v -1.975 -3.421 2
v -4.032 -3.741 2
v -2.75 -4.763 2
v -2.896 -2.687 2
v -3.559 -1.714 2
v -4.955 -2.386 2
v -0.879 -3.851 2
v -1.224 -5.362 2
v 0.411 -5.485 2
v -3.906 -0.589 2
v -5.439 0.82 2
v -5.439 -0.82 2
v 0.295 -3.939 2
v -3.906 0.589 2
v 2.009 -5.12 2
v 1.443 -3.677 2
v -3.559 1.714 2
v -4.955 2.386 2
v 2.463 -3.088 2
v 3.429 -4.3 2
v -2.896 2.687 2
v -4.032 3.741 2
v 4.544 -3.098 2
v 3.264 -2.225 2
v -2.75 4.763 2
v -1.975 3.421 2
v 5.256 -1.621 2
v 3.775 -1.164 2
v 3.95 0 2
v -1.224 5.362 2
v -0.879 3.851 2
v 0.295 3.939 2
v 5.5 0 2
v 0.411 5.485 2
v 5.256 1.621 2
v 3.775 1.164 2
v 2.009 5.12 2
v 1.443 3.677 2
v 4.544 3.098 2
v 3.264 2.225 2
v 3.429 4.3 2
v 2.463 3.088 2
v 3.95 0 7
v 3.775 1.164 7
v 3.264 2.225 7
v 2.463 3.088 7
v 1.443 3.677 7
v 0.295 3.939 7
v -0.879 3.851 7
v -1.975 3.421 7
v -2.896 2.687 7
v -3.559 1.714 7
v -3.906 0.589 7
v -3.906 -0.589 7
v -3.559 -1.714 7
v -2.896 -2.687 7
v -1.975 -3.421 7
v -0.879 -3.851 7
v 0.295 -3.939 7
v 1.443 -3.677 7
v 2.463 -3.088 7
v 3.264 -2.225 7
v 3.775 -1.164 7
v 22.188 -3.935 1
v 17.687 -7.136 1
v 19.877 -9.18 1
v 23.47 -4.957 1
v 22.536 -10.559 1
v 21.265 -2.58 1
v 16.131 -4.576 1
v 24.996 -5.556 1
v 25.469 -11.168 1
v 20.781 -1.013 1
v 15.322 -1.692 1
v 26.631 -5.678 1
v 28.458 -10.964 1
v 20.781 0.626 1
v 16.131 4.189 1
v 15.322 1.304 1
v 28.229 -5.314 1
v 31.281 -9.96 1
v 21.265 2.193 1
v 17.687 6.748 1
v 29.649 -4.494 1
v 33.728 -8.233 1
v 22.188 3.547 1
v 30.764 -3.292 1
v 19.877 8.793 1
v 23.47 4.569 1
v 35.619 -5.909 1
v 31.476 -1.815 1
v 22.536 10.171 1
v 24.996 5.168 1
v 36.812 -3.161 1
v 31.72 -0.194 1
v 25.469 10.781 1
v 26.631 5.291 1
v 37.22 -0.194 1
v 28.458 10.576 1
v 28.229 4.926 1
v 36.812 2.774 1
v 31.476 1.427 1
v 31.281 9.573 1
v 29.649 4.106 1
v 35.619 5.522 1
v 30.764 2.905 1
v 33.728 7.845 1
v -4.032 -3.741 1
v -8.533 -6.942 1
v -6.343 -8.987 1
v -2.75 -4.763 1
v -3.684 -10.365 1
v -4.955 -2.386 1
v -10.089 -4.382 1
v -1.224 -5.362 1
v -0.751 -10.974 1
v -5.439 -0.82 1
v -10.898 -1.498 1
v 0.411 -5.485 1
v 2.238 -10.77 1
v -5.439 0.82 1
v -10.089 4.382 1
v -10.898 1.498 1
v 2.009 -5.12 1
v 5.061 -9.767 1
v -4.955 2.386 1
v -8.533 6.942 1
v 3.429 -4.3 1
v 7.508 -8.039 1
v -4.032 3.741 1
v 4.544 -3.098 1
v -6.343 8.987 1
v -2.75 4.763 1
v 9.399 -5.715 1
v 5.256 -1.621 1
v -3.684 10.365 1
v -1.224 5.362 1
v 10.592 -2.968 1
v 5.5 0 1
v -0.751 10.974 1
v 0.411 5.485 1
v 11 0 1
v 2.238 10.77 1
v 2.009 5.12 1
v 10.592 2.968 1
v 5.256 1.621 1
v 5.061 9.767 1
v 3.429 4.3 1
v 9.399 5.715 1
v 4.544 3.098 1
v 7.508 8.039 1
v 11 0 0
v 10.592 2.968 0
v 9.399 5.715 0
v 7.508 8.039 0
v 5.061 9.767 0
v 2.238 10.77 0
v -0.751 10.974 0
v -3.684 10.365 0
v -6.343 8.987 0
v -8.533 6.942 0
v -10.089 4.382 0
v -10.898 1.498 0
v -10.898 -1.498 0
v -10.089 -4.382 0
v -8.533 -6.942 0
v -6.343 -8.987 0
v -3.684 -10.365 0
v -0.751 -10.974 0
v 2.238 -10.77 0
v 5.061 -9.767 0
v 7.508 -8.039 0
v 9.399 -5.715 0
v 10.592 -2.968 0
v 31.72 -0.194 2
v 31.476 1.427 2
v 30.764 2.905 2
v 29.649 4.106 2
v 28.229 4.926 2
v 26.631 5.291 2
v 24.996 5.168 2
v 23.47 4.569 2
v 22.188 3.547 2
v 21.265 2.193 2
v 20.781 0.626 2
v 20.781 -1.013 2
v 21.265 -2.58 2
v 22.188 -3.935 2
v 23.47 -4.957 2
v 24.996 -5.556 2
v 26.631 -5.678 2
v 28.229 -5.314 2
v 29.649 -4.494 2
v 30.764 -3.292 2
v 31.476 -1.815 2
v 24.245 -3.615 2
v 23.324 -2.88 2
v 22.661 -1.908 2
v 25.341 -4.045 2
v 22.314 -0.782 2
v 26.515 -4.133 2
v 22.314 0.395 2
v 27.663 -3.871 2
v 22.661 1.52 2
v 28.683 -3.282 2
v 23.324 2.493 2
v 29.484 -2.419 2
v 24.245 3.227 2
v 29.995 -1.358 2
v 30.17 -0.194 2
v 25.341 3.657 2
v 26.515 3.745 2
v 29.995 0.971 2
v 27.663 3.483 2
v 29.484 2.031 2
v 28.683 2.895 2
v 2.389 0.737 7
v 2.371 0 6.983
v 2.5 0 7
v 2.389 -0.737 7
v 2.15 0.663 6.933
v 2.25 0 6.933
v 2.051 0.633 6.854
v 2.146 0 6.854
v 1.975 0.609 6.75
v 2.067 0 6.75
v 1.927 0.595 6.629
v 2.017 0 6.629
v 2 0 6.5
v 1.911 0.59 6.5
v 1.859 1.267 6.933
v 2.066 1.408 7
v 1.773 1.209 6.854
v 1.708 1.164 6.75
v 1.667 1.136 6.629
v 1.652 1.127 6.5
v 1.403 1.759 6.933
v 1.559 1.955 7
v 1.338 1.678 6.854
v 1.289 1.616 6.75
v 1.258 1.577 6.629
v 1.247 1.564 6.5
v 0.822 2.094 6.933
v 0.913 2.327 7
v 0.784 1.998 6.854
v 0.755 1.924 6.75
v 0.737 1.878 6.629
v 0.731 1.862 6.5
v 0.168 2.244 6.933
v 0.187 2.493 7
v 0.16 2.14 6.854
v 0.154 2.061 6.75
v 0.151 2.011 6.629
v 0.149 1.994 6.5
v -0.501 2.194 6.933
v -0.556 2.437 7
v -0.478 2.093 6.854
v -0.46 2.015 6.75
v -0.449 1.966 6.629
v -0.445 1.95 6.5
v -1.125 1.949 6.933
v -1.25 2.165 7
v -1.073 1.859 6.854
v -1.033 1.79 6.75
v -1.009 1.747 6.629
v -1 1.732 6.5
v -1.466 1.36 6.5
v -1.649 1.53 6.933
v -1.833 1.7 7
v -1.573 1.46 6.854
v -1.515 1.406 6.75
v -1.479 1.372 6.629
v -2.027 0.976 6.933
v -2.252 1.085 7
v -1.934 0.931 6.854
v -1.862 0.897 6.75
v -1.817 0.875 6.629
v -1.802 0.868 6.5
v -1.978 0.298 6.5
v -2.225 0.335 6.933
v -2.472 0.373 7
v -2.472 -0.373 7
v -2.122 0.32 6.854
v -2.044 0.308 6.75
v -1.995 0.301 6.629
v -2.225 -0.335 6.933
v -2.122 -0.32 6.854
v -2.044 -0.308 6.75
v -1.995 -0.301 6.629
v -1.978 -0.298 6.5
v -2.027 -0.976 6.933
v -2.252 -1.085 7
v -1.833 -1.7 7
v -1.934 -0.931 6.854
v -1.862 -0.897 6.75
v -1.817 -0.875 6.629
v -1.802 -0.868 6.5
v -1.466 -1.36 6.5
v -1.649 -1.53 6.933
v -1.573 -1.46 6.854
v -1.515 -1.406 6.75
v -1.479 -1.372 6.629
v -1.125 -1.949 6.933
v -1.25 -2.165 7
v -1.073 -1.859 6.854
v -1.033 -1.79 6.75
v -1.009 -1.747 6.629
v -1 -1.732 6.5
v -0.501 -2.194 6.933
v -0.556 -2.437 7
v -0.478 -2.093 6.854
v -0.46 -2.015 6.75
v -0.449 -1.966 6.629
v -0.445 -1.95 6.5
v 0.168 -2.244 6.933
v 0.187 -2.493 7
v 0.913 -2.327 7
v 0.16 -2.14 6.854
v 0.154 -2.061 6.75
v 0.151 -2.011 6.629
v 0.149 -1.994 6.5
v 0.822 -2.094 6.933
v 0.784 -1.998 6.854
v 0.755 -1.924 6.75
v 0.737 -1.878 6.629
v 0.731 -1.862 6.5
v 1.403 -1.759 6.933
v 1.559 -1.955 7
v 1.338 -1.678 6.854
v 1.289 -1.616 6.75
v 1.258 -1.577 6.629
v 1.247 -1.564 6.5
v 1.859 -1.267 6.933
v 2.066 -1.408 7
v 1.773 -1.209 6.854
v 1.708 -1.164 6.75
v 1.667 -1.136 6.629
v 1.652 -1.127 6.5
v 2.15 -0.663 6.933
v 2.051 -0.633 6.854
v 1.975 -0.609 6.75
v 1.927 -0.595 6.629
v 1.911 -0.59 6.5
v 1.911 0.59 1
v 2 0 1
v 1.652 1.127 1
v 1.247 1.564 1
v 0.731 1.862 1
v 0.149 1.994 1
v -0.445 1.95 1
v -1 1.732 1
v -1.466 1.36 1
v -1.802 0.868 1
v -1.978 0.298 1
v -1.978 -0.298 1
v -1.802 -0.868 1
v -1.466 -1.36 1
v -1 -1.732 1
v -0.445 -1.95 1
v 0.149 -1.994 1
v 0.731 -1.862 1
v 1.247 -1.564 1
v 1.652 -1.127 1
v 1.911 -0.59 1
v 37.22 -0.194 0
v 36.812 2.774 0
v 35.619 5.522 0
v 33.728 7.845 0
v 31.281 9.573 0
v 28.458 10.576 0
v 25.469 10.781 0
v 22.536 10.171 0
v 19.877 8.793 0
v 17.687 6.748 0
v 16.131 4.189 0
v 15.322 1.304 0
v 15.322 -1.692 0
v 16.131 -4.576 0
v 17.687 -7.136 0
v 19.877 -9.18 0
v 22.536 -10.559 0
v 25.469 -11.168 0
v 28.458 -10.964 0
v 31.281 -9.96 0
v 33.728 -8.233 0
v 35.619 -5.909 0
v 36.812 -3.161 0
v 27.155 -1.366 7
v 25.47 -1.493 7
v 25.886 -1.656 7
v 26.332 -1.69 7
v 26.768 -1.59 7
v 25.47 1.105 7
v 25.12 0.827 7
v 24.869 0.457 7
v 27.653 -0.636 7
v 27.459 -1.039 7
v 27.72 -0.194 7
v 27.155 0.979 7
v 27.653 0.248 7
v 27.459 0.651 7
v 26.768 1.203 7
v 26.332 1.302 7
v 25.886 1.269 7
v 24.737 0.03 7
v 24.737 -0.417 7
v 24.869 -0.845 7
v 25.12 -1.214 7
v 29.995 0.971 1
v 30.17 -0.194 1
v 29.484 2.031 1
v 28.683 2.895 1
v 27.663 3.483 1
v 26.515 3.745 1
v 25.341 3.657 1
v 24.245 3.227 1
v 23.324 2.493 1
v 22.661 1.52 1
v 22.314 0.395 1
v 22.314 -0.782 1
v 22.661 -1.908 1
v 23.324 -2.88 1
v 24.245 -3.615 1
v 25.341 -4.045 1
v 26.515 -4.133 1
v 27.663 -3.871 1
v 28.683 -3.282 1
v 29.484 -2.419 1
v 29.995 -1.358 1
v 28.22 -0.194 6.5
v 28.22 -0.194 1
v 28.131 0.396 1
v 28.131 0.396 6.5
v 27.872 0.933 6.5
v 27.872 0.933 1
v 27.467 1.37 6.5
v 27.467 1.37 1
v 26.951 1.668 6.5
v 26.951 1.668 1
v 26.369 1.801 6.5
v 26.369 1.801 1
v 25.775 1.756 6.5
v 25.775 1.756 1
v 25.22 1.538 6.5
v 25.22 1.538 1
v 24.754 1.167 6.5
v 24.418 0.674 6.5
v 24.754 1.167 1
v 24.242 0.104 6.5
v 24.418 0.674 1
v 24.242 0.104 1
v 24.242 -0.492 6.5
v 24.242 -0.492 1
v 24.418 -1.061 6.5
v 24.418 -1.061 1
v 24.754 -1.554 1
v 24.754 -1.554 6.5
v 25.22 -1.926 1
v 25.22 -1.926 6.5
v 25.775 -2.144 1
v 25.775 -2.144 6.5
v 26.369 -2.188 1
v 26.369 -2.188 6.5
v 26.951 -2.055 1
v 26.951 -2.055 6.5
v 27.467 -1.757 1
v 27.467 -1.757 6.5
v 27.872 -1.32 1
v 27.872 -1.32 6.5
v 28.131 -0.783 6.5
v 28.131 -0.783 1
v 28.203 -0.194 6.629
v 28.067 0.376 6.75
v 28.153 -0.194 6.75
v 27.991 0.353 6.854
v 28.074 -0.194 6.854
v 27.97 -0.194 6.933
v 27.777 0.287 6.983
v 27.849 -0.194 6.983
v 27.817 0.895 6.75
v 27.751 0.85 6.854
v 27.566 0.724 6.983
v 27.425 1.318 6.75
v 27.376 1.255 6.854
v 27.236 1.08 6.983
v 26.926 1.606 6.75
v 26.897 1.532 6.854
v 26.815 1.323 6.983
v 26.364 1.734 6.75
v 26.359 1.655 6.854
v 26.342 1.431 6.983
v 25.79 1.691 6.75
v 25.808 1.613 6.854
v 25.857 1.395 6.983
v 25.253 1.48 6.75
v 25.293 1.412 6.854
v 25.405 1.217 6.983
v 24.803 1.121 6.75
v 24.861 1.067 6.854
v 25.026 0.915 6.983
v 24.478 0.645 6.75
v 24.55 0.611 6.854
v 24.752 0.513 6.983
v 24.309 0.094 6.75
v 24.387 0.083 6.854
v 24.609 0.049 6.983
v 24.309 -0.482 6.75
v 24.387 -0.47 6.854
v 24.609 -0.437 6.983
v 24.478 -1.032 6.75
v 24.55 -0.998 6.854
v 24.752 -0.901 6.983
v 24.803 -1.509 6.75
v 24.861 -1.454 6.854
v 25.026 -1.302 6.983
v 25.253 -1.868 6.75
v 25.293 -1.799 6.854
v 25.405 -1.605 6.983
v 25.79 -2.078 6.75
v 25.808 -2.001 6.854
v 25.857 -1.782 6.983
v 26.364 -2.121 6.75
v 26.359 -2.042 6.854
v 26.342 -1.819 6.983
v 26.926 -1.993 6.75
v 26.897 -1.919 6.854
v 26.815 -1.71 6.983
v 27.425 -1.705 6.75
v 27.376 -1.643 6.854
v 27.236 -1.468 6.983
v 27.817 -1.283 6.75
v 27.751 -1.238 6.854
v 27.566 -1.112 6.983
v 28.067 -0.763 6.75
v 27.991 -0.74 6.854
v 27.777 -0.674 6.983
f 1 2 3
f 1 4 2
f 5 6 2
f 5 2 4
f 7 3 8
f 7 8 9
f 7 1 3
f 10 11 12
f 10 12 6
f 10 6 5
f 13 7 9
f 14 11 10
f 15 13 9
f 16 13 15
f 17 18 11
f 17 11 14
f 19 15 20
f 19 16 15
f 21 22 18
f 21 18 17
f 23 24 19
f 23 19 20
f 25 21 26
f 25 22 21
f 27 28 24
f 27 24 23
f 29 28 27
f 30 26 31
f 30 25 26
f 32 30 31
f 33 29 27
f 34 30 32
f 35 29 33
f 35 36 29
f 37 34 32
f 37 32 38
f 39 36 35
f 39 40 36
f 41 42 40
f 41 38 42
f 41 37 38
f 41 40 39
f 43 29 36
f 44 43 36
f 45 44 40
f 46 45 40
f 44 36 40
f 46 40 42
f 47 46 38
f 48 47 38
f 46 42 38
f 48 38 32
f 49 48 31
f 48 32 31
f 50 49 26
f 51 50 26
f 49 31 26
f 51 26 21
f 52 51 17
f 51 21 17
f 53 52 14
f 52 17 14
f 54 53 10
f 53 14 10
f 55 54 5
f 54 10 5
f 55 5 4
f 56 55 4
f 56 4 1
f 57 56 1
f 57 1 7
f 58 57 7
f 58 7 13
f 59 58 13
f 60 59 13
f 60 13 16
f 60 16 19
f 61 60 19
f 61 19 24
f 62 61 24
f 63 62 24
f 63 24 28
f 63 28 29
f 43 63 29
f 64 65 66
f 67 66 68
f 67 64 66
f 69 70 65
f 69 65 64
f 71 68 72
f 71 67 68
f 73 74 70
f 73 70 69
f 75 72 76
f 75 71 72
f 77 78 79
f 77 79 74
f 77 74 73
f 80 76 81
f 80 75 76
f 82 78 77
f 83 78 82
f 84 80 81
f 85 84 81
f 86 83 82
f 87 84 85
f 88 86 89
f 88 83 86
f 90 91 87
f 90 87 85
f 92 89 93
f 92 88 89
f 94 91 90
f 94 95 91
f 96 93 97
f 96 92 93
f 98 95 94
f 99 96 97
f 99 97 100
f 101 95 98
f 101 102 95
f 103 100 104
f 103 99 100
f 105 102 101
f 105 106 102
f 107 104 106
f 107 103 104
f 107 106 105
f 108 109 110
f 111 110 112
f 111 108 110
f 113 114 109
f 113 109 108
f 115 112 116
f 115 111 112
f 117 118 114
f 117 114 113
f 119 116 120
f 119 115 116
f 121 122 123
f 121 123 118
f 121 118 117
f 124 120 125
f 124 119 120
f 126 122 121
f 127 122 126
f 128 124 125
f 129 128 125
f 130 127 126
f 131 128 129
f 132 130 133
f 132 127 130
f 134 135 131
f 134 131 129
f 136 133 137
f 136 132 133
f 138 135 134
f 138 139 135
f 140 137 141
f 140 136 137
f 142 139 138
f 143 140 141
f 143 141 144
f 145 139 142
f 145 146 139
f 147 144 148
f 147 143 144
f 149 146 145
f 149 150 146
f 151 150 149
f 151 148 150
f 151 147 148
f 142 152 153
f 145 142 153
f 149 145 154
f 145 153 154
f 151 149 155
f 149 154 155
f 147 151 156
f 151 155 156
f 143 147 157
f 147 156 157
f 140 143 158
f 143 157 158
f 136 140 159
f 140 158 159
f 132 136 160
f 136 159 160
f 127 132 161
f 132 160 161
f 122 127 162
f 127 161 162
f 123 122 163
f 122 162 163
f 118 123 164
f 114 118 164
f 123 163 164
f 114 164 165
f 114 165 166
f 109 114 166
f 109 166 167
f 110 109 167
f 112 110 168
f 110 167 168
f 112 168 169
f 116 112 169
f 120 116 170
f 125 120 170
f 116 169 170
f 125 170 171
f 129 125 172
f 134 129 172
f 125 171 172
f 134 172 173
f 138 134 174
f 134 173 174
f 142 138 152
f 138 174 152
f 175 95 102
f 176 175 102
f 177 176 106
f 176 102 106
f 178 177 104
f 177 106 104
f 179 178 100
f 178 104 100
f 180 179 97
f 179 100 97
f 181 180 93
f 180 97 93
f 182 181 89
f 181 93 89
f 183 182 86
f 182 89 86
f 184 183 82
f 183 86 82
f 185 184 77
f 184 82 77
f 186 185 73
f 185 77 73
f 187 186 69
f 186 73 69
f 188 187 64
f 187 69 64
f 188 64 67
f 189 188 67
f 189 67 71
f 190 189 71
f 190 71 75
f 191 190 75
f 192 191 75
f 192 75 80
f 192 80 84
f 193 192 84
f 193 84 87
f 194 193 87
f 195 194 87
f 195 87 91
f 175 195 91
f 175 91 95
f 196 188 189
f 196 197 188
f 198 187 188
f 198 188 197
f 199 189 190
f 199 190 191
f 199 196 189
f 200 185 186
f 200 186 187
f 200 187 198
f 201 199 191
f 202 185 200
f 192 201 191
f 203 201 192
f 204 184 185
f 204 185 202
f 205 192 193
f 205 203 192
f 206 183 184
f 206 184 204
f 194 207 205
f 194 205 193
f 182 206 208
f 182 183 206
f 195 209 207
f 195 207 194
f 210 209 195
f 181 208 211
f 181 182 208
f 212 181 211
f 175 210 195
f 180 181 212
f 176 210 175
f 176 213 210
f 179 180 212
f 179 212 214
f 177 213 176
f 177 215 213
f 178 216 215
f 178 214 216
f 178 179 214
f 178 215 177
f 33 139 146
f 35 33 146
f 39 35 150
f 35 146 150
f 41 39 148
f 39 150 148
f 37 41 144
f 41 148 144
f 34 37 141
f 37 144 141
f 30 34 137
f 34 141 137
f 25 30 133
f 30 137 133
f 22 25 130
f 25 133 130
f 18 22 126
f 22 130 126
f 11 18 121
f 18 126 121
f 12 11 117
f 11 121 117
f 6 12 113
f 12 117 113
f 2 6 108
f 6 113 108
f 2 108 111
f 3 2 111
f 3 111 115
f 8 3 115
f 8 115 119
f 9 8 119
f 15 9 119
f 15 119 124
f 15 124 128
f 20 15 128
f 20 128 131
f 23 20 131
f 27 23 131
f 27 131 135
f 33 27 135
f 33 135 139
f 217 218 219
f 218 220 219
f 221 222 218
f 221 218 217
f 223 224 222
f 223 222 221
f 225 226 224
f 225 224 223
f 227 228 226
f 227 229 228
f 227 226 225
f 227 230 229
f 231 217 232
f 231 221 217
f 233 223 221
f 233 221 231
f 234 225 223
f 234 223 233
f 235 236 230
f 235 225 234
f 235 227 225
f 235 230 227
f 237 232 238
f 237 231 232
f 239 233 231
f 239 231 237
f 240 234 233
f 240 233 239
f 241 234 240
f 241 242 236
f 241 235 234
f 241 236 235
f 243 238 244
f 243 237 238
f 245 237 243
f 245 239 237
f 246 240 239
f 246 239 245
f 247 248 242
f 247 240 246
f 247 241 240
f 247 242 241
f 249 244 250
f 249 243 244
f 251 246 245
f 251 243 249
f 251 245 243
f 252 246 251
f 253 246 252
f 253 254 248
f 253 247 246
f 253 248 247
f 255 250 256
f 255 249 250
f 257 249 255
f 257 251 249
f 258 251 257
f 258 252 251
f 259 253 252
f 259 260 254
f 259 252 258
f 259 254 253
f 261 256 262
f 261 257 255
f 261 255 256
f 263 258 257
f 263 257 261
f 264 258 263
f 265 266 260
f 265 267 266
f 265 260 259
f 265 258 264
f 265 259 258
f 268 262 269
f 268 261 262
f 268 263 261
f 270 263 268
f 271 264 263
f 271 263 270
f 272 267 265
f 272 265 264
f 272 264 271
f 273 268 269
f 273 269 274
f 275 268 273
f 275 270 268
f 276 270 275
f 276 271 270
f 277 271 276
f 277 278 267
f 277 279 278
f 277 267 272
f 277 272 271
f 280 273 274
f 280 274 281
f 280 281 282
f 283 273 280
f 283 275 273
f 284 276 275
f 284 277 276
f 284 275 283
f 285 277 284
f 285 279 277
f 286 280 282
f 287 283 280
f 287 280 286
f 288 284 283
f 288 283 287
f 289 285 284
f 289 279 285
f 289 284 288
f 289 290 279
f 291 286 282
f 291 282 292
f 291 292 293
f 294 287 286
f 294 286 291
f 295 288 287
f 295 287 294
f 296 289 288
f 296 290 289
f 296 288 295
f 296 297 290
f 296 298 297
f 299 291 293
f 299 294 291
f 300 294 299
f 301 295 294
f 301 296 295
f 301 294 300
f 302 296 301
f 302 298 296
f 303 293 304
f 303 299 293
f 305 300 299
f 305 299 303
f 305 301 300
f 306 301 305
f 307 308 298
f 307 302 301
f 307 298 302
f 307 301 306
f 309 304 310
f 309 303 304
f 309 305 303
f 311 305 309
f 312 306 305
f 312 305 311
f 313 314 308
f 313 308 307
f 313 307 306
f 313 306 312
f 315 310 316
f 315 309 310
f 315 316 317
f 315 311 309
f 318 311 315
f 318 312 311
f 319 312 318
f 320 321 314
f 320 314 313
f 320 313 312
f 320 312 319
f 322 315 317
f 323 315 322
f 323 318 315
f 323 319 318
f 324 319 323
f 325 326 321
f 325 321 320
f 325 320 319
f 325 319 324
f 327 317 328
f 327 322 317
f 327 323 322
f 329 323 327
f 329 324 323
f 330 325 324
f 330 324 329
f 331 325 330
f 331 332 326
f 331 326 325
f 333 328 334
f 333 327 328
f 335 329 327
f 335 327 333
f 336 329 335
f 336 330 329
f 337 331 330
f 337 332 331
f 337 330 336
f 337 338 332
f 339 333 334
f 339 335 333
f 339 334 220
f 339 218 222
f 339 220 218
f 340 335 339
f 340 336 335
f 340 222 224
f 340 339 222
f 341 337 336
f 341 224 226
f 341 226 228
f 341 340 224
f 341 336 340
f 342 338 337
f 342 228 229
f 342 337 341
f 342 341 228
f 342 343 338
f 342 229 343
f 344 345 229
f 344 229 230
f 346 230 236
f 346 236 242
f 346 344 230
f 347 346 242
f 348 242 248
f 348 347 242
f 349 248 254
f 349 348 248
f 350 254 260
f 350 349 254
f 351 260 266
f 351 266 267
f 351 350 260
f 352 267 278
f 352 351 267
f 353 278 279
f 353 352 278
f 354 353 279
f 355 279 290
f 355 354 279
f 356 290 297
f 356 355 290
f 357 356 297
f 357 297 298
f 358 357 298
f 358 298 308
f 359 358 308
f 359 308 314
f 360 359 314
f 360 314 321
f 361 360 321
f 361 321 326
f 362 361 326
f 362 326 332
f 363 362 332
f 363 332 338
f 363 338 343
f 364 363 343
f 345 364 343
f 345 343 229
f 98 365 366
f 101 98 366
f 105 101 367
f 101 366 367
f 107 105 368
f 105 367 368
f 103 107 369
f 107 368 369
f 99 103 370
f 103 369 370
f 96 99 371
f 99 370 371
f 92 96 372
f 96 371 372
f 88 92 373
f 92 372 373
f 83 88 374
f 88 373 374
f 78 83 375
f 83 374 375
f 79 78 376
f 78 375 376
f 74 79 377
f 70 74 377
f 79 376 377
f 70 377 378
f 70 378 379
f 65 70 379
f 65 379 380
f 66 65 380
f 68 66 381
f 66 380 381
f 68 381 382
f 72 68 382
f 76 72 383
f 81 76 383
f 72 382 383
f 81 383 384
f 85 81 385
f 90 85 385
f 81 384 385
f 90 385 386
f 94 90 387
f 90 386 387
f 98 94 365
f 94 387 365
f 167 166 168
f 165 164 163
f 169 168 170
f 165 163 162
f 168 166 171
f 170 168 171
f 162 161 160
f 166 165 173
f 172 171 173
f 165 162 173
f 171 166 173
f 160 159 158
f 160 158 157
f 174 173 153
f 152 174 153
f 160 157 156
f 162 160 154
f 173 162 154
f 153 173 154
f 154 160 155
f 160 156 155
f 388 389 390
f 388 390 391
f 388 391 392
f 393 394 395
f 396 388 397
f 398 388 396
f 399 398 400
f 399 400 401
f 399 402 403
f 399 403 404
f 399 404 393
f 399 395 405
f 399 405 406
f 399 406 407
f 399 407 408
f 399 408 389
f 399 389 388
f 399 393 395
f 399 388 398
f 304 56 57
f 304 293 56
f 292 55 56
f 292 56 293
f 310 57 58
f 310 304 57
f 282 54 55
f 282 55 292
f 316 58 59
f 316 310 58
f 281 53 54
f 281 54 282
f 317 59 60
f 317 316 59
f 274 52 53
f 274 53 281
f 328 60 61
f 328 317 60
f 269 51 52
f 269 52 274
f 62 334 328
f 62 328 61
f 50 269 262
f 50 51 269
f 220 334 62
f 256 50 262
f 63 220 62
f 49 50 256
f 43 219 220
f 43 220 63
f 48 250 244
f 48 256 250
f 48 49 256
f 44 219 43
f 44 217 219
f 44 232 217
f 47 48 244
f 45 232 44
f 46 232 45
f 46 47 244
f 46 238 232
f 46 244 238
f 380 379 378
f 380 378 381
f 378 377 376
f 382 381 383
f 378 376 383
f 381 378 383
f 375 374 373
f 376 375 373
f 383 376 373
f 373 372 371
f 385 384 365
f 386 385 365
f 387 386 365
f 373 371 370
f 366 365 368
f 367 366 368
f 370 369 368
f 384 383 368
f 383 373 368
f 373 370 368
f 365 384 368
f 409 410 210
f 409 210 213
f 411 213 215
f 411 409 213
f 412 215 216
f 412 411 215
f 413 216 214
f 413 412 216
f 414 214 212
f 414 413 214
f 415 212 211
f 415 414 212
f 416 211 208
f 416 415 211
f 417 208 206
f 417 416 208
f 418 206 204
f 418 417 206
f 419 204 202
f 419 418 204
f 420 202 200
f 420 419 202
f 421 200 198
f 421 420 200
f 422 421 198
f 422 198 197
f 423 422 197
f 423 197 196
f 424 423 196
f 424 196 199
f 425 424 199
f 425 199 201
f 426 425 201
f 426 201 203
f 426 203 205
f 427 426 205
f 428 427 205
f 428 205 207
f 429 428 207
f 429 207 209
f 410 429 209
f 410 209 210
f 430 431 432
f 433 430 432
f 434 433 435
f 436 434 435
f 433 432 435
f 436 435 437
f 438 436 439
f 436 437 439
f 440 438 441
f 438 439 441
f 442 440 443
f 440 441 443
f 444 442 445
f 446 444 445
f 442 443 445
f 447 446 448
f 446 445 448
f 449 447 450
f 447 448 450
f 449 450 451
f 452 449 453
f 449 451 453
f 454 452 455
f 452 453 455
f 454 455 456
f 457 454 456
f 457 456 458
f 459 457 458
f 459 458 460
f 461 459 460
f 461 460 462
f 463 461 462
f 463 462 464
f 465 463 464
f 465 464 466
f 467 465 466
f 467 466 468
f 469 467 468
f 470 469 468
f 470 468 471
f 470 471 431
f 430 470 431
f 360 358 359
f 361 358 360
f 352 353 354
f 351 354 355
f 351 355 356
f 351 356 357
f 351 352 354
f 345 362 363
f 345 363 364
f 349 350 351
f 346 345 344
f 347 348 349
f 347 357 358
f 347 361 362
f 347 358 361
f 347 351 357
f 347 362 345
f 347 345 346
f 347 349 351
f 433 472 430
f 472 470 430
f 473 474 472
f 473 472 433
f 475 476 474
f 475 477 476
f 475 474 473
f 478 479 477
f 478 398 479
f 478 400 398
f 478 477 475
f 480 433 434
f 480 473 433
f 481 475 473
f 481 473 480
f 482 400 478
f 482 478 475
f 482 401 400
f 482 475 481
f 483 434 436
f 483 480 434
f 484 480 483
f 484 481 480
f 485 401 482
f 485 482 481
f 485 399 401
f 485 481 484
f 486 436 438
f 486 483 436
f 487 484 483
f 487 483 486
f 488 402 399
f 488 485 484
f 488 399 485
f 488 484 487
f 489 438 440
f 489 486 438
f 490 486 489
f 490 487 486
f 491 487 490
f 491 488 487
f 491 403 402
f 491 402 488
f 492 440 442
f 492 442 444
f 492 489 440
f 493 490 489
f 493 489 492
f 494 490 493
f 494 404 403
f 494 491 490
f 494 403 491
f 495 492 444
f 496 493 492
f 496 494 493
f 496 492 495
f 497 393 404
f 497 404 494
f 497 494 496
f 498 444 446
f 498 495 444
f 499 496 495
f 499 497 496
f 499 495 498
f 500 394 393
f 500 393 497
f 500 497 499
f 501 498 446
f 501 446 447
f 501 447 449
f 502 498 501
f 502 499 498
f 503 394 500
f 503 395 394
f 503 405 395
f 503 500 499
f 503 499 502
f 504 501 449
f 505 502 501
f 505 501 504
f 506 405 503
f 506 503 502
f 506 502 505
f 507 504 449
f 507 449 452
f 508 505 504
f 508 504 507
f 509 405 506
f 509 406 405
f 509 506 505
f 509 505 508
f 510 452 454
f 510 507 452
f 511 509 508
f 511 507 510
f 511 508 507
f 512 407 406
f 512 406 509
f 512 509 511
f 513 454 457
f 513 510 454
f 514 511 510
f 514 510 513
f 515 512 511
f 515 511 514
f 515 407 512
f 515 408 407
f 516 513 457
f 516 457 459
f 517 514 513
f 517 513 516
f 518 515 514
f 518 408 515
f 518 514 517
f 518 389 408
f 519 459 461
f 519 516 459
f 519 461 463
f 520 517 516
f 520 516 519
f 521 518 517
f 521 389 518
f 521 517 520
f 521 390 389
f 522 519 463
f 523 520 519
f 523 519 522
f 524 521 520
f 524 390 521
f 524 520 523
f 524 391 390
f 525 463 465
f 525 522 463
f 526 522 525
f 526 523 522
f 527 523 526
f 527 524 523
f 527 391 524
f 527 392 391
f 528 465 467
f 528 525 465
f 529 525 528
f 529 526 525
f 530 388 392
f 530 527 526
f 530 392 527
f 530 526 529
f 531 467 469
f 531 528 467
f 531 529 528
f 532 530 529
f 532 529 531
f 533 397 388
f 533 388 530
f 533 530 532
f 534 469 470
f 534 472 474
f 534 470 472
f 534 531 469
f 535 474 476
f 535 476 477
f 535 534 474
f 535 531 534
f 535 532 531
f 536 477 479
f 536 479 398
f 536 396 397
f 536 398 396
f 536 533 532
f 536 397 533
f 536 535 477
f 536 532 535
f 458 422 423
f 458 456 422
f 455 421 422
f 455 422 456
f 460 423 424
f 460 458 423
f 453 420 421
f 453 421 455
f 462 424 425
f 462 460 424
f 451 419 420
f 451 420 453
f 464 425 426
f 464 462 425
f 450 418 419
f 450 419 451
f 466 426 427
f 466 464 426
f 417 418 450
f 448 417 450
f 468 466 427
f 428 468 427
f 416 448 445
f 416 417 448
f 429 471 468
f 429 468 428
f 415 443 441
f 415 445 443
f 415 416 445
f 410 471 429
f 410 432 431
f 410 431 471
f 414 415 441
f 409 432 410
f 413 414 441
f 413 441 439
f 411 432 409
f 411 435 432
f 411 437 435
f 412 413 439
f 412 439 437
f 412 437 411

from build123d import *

# Parameters (mm, degrees)
F0_R     = 11
F0_R_2   = 5.5
F1_DEPTH = 1
F0_R_3   = 3.95
F2_DEPTH = 2
F0_R_4   = 2
F3_DEPTH = 7
F4_DEPTH = 1
F5_R     = 0.5
F5_2_R   = 0.5


with BuildPart() as f1:
    # F0 (on Top) → F1 (new body)
    with BuildSketch(Plane.XY):
        Circle(F0_R)
        Circle(F0_R_2, mode=Mode.SUBTRACT)
    extrude(amount=F1_DEPTH)

    # F0 (on Top) → F2 (join)
    with BuildSketch(Plane.XY):
        Circle(F0_R_2)
        Circle(F0_R_3, mode=Mode.SUBTRACT)
    extrude(amount=F2_DEPTH)

    # F0 (on Top) → F3 (join)
    with BuildSketch(Plane.XY):
        Circle(F0_R_3)
        Circle(F0_R_4, mode=Mode.SUBTRACT)
    extrude(amount=F3_DEPTH)

    # F0 (on Top) → F4, piece 2 (join)
    with BuildSketch(Plane.XY):
        Circle(F0_R_4)
    extrude(amount=F4_DEPTH)

    # F5
    f5_edges = [f1.edges().sort_by_distance(p)[0] for p in [
        (-2, 0, 7),
    ]]
    fillet(f5_edges, radius=F5_R)


with BuildPart() as f1b:
    # F0 (on Top) → F1, piece 2 (new body)
    with BuildSketch(Plane.XY):
        with Locations((26.220003143, -0.1937223424)):
            Circle(F0_R)
        with Locations((26.220003143, -0.1937223424)):
            Circle(F0_R_2, mode=Mode.SUBTRACT)
    extrude(amount=F1_DEPTH)

    # F0 (on Top) → F2, piece 2 (join)
    with BuildSketch(Plane.XY):
        with Locations((26.220003143, -0.1937223424)):
            Circle(F0_R_2)
        with Locations((26.220003143, -0.1937223424)):
            Circle(F0_R_3, mode=Mode.SUBTRACT)
    extrude(amount=F2_DEPTH)



with BuildPart() as f3:
    # F0 (on Top) → F3, piece 2 (new body)
    with BuildSketch(Plane.XY):
        with Locations((26.220003143, -0.1937223424)):
            Circle(F0_R_4)
    extrude(amount=F3_DEPTH)


with BuildPart() as f1b_1:
    add(f1b.part)

    add(f3.part)  # F4 merges F3
    # F0 (on Top) → F4 (join)
    with BuildSketch(Plane.XY):
        with Locations((26.220003143, -0.1937223424)):
            Circle(F0_R_3)
        with Locations((26.220003143, -0.1937223424)):
            Circle(F0_R_4, mode=Mode.SUBTRACT)
    extrude(amount=F4_DEPTH)

    # F5#2
    f5_2_edges = [f1b_1.edges().sort_by_distance(p)[0] for p in [
        (24.220003, -0.193722, 7),
    ]]
    fillet(f5_2_edges, radius=F5_2_R)


solid = Compound([f1.part, f1b_1.part])
